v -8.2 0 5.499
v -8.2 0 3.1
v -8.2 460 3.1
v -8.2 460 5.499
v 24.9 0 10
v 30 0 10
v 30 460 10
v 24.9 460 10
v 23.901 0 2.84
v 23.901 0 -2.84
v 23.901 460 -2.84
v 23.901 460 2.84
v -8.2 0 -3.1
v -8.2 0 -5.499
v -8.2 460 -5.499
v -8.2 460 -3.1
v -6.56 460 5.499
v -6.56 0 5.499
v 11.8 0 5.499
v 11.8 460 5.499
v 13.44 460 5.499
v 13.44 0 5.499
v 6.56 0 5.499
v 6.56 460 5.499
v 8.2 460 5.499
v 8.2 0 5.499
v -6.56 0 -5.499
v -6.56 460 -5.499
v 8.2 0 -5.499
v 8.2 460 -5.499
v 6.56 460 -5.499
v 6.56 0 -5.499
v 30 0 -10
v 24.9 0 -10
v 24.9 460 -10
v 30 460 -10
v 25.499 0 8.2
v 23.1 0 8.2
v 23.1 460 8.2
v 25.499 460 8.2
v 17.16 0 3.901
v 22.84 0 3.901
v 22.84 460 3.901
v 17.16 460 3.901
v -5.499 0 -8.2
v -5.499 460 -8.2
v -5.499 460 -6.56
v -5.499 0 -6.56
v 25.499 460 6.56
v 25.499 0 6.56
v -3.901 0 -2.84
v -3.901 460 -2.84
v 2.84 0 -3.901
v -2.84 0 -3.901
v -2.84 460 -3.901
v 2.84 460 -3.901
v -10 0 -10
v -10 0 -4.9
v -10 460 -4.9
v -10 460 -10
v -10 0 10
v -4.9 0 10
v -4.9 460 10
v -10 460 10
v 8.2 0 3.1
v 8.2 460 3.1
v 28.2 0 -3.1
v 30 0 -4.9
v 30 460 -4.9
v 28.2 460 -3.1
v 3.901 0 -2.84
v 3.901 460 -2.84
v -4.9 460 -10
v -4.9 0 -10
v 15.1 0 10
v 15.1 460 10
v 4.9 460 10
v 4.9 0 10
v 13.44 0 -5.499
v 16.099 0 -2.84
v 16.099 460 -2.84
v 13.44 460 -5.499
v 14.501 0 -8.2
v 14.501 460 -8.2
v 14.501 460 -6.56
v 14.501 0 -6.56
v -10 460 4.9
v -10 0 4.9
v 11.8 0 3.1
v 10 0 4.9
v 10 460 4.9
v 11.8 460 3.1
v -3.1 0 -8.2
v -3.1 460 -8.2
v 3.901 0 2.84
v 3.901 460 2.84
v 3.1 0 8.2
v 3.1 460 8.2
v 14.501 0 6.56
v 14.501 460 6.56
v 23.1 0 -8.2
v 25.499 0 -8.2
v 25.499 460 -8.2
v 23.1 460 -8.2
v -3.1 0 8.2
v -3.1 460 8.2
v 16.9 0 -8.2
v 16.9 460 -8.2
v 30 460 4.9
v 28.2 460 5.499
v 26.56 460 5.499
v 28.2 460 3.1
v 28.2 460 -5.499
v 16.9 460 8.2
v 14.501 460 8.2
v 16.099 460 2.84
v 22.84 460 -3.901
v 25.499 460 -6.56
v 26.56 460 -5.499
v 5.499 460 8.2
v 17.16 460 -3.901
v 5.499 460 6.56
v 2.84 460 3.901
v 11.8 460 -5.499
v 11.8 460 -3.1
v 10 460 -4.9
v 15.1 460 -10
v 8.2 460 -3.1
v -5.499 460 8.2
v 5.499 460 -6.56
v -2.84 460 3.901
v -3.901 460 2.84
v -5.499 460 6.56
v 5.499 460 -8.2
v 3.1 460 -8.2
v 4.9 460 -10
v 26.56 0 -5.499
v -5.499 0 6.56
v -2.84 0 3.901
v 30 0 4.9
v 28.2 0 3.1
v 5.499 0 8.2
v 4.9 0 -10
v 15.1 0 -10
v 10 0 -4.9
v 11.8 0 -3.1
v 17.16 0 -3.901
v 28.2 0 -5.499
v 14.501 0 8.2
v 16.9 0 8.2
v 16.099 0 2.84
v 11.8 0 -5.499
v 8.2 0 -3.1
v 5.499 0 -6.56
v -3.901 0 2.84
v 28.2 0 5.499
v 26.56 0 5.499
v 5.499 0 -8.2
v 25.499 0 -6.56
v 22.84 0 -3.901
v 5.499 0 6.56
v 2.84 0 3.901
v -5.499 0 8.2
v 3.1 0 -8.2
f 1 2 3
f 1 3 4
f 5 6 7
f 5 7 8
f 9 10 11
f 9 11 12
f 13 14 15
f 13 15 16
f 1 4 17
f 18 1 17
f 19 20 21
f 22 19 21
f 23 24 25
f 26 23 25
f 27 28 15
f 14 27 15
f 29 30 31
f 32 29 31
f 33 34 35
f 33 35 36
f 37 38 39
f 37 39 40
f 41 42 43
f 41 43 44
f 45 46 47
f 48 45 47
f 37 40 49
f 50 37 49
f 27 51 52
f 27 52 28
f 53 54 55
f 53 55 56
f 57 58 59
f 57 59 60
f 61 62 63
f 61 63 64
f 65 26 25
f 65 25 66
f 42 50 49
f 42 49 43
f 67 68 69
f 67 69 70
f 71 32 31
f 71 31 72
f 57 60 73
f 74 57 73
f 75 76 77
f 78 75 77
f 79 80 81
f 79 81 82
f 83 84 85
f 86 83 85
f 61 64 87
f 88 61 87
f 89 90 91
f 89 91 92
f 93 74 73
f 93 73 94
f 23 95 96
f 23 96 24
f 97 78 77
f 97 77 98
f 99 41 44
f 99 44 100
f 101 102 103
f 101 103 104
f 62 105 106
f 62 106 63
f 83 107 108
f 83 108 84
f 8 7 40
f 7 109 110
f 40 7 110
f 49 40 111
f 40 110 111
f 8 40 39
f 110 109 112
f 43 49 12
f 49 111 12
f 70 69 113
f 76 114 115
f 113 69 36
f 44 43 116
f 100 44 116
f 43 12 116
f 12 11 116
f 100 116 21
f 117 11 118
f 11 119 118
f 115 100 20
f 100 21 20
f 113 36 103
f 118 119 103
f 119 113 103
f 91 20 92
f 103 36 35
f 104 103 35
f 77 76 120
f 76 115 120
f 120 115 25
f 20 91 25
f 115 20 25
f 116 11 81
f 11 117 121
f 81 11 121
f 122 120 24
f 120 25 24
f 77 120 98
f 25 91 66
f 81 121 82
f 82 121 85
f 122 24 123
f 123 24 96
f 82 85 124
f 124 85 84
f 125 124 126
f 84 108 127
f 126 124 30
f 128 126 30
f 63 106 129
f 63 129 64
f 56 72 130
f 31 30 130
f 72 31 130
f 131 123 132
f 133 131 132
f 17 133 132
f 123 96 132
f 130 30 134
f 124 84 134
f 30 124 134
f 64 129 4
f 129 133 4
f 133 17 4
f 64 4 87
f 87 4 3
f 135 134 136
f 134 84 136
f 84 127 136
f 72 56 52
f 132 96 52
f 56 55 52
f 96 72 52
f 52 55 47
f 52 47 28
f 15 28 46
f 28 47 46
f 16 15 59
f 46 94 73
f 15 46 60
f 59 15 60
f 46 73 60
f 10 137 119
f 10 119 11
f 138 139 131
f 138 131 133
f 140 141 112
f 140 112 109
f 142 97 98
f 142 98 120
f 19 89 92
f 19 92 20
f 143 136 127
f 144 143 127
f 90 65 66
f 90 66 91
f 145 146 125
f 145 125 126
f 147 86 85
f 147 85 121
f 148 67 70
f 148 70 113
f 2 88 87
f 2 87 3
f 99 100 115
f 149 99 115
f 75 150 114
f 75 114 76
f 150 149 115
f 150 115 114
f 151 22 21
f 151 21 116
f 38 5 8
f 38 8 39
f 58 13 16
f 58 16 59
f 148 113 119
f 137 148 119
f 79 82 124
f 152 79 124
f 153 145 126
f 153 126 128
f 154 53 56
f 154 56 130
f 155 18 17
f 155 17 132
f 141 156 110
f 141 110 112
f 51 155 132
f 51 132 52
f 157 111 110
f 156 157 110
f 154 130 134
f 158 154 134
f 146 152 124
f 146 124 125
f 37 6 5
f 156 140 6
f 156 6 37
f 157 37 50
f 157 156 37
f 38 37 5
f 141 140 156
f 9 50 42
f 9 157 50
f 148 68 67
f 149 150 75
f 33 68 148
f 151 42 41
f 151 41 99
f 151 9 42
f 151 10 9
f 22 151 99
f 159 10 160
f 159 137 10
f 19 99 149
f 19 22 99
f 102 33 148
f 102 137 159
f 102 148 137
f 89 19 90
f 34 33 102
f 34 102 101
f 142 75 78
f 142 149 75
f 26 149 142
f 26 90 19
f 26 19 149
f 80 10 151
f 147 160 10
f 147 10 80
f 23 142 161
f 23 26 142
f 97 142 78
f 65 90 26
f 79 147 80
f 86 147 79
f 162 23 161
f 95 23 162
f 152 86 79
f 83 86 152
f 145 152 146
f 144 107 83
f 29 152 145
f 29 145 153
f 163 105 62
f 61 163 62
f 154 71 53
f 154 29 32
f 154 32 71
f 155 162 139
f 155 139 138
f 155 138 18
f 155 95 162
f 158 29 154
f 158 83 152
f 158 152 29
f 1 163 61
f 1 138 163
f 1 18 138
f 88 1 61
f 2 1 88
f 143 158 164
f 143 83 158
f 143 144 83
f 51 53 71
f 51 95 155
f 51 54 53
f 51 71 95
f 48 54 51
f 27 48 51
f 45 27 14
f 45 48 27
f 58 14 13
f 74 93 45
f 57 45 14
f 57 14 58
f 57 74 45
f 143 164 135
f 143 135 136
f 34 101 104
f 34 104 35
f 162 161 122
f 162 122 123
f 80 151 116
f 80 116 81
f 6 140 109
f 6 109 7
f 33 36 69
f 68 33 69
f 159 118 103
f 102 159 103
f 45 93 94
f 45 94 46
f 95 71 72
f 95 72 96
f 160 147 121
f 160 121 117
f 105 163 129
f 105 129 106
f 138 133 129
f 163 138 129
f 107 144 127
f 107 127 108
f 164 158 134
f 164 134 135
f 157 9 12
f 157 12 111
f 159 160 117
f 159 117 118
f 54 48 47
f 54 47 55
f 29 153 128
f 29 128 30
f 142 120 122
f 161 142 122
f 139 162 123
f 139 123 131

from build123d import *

# Parameters (mm, degrees)
BOSS_EXTRUDE1_DEPTH = 460
LPATTERN1_COUNT     = 2
LPATTERN1_PITCH     = 20


with BuildPart() as part:
    # Sketch1 → Boss-Extrude1 (new body)
    with BuildSketch(Plane(origin=(0, 0, 0), x_dir=(1, 0, 0), z_dir=(0, 1, 0))):
        Polygon((2.84, -3.900660172), (-2.84, -3.900660172), (-5.499339828, -6.56), (-5.499339828, -8.2), (-3.1, -8.2), (-4.9, -10), (-10, -10), (-10, -4.9), (-8.2, -3.1), (-8.2, -5.499339828), (-6.56, -5.499339828), (-3.900660172, -2.84), (-3.900660172, 2.84), (-6.56, 5.499339828), (-8.2, 5.499339828), (-8.2, 3.1), (-10, 4.9), (-10, 10), (-4.9, 10), (-3.1, 8.2), (-5.499339828, 8.2), (-5.499339828, 6.56), (-2.84, 3.900660172), (2.84, 3.900660172), (5.499339828, 6.56), (5.499339828, 8.2), (3.1, 8.2), (4.9, 10), (10, 10), (10, 4.9), (8.2, 3.1), (8.2, 5.499339828), (6.56, 5.499339828), (3.900660172, 2.84), (3.900660172, -2.84), (6.56, -5.499339828), (8.2, -5.499339828), (8.2, -3.1), (10, -4.9), (10, -10), (4.9, -10), (3.1, -8.2), (5.499339828, -8.2), (5.499339828, -6.56), align=None)
    boss_extrude1 = extrude(amount=BOSS_EXTRUDE1_DEPTH)

    # LPattern1: Boss-Extrude1 ×2
    with Locations(*[(i * LPATTERN1_PITCH, 0, 0) for i in range(1, LPATTERN1_COUNT)]):
        add(boss_extrude1)


solid = part.part
